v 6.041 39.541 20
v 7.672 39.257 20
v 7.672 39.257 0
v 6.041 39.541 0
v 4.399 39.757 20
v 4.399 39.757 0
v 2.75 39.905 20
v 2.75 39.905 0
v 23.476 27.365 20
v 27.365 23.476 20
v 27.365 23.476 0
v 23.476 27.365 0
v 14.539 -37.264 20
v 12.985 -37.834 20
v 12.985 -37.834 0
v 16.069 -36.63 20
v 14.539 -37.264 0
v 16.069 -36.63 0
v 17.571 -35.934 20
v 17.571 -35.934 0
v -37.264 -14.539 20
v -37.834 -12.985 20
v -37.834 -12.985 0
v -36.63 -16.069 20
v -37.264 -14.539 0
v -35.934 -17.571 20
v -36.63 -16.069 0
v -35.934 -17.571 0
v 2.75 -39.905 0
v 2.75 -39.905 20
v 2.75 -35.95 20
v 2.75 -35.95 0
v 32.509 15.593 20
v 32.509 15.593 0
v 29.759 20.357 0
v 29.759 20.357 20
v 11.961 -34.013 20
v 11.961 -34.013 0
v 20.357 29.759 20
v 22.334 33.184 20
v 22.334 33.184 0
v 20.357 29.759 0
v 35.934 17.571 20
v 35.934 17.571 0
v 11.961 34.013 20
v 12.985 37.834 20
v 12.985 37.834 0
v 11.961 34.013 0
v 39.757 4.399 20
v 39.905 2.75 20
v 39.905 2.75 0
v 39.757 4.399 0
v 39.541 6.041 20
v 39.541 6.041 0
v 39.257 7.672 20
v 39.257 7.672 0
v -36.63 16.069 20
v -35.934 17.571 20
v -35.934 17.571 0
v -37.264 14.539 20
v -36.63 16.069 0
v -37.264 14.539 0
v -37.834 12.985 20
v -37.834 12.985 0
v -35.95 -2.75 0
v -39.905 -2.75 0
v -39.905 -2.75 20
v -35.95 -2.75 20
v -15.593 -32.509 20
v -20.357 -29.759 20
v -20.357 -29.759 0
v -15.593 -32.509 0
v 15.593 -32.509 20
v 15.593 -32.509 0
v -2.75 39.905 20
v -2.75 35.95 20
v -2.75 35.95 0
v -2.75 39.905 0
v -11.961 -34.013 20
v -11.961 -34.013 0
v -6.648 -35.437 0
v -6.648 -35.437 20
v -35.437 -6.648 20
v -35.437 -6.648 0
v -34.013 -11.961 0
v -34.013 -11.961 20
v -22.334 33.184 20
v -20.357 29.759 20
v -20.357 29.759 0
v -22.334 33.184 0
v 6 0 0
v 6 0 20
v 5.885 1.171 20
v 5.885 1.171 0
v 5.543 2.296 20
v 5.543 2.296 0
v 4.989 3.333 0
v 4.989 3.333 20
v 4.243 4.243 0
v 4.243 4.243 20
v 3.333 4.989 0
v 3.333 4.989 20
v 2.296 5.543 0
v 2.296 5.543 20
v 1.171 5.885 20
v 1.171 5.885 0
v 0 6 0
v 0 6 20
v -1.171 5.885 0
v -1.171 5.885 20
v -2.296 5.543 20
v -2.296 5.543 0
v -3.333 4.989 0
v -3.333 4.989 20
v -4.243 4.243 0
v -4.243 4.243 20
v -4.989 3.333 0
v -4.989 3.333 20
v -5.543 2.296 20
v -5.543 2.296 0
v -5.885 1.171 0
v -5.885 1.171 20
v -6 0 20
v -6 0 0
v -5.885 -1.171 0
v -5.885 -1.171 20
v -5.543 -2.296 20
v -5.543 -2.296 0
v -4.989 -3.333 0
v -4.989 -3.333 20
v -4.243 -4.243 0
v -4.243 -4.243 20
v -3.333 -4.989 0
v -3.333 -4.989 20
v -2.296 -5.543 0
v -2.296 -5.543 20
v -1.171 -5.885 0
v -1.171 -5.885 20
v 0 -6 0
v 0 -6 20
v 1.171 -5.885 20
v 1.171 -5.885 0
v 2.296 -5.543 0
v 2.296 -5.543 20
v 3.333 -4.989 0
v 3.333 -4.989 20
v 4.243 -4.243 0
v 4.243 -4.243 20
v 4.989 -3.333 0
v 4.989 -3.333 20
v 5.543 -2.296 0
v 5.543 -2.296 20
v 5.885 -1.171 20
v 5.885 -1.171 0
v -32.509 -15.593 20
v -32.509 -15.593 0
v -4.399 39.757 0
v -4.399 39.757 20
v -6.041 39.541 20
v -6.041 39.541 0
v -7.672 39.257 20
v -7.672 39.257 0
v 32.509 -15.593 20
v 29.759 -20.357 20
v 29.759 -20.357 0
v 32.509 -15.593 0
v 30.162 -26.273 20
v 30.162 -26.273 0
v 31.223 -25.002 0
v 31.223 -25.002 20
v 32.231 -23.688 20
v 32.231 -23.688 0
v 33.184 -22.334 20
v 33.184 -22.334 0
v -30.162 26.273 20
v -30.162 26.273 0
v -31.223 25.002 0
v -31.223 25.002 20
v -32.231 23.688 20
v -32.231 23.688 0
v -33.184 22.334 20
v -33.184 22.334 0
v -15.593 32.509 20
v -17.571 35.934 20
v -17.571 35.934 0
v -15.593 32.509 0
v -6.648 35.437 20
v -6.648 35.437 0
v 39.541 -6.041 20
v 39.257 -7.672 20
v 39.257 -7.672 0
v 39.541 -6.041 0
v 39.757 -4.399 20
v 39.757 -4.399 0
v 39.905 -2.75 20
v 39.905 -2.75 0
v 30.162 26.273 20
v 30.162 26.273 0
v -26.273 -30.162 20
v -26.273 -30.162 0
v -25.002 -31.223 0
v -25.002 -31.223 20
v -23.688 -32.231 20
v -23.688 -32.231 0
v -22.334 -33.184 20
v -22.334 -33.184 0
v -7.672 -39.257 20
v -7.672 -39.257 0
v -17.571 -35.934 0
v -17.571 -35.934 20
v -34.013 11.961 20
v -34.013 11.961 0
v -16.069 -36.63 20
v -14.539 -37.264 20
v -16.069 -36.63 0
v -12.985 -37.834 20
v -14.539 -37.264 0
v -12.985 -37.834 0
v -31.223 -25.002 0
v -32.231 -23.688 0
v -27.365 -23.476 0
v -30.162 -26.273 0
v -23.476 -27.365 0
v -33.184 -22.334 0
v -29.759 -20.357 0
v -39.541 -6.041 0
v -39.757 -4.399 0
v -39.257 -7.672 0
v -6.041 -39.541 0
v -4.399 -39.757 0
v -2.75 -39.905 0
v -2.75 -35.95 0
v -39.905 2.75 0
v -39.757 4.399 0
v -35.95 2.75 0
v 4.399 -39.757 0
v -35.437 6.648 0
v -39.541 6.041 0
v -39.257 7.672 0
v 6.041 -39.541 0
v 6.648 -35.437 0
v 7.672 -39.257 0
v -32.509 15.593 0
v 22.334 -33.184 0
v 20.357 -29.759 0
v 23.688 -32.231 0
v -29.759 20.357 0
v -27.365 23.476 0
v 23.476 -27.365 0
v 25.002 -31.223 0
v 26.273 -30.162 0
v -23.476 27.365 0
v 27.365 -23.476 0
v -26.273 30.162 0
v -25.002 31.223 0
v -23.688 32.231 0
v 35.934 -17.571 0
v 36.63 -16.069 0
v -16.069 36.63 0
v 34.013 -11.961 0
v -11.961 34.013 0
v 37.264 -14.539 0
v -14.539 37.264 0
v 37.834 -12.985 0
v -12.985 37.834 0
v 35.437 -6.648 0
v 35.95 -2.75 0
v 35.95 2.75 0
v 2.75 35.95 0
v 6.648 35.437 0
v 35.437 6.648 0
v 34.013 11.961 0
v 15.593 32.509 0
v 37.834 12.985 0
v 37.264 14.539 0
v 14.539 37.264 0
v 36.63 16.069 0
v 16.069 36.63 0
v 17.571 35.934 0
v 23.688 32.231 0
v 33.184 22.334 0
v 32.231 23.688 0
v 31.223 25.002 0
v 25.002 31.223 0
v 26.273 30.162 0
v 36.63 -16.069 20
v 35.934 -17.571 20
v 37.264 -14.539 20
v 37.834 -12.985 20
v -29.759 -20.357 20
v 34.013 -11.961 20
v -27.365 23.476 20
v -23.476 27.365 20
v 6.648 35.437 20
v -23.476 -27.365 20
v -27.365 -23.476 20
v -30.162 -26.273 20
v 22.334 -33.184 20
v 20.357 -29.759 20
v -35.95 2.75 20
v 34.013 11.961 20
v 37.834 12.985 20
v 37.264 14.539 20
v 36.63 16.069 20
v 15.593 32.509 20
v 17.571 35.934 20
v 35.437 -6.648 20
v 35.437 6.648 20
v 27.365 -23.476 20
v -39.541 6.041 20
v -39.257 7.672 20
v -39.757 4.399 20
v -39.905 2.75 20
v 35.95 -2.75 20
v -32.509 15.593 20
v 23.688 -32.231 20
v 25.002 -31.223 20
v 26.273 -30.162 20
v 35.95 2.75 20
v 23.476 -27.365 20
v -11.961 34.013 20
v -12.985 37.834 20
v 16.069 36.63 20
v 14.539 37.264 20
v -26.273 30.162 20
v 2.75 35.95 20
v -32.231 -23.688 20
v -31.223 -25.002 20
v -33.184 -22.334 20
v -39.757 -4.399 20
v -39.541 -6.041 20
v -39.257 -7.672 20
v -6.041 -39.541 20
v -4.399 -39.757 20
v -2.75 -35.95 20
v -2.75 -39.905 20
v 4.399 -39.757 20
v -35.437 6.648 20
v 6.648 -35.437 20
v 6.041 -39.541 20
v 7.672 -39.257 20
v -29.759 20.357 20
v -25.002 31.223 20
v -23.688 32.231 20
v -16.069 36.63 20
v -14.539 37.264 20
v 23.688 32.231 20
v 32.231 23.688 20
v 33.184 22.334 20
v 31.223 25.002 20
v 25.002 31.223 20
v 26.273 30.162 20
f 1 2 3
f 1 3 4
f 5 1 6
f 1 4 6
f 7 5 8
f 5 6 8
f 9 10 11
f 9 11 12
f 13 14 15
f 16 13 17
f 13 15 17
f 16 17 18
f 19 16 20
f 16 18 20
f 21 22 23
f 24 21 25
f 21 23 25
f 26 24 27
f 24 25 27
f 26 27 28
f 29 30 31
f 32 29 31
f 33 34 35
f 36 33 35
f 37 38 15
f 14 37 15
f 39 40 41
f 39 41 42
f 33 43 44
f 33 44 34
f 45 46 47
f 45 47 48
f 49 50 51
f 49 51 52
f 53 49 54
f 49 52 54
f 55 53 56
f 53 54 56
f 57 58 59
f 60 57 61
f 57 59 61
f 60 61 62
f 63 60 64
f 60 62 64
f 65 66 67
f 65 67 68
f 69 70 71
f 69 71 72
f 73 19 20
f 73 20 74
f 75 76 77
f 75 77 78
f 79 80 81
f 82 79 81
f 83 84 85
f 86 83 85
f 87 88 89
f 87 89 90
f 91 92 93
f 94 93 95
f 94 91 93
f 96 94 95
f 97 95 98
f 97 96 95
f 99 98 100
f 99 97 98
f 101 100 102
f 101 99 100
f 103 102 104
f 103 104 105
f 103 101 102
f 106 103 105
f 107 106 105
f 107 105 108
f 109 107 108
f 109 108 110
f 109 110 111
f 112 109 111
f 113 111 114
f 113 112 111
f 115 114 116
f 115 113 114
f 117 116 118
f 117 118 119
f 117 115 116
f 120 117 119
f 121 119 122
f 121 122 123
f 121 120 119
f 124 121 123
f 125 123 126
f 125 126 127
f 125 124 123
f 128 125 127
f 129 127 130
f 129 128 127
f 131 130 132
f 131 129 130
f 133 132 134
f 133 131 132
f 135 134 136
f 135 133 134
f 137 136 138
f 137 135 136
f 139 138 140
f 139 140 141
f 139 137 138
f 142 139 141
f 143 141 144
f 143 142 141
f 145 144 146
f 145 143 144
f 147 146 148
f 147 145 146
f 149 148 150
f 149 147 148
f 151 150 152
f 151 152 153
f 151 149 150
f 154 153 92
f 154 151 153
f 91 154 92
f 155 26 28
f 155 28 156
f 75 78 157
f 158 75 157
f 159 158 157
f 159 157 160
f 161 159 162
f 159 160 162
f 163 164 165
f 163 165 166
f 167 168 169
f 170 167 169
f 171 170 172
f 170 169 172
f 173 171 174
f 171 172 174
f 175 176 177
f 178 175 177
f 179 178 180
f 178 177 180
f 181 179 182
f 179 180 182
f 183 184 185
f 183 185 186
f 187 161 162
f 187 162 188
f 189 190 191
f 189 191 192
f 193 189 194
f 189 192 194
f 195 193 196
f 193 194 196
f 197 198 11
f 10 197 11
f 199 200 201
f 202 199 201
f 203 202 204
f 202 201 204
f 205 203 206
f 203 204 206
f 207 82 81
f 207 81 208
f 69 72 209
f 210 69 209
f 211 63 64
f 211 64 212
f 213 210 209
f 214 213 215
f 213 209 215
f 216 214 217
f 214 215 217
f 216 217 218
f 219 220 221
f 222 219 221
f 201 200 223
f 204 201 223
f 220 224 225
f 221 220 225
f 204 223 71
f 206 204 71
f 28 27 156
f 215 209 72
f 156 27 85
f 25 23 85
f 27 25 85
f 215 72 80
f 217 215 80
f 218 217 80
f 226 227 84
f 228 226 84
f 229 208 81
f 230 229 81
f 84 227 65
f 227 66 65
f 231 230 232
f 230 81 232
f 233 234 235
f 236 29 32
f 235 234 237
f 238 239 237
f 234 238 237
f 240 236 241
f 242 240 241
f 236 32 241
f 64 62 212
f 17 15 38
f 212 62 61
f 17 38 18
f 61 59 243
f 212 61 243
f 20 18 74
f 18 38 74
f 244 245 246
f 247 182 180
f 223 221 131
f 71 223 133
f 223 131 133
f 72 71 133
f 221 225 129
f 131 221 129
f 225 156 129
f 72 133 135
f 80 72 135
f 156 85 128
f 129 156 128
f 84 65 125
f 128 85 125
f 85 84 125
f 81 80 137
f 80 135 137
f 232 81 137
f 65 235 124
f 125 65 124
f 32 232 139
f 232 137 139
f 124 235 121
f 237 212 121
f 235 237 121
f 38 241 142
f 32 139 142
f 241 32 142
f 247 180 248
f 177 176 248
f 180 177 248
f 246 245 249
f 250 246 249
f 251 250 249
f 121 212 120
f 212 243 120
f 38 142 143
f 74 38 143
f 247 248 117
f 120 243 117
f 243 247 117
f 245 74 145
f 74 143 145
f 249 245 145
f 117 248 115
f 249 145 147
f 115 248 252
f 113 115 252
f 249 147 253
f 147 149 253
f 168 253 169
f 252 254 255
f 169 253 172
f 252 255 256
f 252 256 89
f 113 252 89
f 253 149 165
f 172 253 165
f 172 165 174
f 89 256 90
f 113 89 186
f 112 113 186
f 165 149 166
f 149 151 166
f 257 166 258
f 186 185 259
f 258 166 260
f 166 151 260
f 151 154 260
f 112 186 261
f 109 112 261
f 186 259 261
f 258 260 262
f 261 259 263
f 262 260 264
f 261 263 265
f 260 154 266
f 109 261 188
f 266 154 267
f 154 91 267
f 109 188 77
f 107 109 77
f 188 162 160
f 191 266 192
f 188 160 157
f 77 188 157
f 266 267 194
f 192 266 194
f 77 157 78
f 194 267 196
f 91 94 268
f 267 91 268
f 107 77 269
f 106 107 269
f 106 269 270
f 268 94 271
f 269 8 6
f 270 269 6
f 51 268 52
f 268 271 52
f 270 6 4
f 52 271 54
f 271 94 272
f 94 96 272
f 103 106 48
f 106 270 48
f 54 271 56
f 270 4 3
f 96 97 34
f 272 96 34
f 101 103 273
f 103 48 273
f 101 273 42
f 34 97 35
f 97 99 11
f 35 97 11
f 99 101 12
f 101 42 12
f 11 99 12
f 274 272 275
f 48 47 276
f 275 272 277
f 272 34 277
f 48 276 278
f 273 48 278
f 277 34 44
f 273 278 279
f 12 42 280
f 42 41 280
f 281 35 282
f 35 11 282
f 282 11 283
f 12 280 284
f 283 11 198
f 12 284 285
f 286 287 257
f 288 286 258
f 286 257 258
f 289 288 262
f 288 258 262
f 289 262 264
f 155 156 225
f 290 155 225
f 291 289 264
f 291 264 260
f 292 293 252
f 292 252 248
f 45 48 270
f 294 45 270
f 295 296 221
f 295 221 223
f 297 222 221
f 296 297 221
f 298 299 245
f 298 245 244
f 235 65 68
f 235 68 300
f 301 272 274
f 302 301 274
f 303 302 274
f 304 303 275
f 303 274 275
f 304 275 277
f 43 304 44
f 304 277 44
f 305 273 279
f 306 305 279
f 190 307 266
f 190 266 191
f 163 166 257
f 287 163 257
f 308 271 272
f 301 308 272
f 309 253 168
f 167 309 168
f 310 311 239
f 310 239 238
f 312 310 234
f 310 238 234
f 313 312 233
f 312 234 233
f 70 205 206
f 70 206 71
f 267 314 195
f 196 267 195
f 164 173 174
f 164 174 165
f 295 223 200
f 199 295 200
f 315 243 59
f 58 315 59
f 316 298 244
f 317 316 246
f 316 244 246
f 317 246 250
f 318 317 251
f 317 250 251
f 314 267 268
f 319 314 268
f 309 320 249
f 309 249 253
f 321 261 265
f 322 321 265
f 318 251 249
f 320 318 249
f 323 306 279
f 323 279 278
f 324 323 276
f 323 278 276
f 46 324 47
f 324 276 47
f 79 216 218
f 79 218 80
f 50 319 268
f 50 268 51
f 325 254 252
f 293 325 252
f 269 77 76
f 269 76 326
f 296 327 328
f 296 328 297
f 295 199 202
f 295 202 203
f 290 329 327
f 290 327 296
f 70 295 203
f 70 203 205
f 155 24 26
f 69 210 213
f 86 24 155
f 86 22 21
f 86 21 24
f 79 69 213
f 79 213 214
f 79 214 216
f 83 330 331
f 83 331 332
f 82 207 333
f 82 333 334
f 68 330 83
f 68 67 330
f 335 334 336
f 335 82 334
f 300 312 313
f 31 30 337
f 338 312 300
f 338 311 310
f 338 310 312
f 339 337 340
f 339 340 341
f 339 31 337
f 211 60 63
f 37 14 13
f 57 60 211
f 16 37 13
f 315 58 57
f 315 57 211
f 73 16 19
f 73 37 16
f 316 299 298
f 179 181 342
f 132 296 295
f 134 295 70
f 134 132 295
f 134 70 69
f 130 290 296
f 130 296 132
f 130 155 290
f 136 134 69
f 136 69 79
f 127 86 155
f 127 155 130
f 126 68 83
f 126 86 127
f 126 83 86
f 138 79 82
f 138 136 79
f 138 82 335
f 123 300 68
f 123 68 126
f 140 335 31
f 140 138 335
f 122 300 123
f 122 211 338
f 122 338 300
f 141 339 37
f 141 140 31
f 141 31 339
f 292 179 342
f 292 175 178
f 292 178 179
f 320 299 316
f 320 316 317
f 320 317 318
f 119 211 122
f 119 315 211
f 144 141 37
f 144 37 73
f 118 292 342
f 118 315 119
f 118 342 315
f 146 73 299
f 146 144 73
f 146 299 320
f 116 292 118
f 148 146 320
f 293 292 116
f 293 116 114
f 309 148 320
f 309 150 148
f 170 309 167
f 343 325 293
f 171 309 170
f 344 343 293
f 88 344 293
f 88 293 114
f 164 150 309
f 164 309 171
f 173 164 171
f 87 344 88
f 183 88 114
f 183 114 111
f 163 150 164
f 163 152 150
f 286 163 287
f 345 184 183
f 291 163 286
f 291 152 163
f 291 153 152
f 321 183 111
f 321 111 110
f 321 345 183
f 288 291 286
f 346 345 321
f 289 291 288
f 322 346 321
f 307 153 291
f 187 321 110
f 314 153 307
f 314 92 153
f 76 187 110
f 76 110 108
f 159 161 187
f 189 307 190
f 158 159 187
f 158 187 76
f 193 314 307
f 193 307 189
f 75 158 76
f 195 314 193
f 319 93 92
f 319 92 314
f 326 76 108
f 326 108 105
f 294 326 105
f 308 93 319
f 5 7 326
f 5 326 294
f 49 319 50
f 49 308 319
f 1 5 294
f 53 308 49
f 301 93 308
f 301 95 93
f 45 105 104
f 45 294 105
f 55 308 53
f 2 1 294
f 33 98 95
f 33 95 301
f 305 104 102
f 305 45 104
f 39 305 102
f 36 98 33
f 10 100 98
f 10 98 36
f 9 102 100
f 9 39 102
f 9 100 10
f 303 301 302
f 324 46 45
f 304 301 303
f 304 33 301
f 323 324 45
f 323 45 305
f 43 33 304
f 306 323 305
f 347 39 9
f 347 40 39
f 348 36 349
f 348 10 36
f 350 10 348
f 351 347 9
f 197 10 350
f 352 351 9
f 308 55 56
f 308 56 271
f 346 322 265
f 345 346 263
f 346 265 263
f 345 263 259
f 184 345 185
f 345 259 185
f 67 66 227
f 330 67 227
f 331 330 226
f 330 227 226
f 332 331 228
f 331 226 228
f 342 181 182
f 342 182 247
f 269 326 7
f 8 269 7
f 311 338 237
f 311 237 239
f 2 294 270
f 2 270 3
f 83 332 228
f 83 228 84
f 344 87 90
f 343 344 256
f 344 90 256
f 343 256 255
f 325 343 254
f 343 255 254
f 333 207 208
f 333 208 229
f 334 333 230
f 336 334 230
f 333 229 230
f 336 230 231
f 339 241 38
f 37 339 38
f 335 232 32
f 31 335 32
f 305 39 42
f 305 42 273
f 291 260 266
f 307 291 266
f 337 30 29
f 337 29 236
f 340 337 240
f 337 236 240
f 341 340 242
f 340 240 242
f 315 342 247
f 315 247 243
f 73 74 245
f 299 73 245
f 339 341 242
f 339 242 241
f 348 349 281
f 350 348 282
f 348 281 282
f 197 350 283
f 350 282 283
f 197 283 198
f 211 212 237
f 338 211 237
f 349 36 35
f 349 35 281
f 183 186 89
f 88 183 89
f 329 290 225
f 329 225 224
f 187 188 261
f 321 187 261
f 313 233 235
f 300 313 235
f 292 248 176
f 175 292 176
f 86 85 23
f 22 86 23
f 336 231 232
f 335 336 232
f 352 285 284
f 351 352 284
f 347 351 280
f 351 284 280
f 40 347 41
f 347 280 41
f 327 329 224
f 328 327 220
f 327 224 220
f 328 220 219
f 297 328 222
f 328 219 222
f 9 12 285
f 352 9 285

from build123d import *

# Parameters (mm, degrees)
SKETCH2_R           = 40
BOSS_EXTRUDE1_DEPTH = 20
SKETCH3_W           = 5.5
SKETCH3_H           = 4.31
SKETCH3_W_2         = 4.31
SKETCH3_H_2         = 5.5
CUT_EXTRUDE1_DEPTH  = 20
SKETCH4_R           = 6
CUT_EXTRUDE2_DEPTH  = 20


with BuildPart() as part:
    # Sketch2 → Boss-Extrude1 (new body)
    with BuildSketch(Plane.XY):
        Circle(SKETCH2_R)
    extrude(amount=BOSS_EXTRUDE1_DEPTH)

    # Sketch3 → Cut-Extrude1 (cut)
    with BuildSketch(Plane.XY):
        Polygon((-6.648248649, -35.436785829), (-7.763758734, -39.59992614), (-13.076350778, -38.176421392), (-11.960840694, -34.013281081), align=None)
        with Locations((0, -38.105)):
            Rectangle(SKETCH3_W, SKETCH3_H)
        Polygon((-15.59343014, -32.508613266), (-17.74843014, -36.241182756), (-22.51156986, -33.491182756), (-20.35656986, -29.758613266), align=None)
        Polygon((-23.475945135, -27.365032432), (-26.523575362, -30.412662659), (-30.412662659, -26.523575362), (-27.365032432, -23.475945135), align=None)
        Polygon((-29.758613266, -20.35656986), (-33.491182756, -22.51156986), (-36.241182756, -17.74843014), (-32.508613266, -15.59343014), align=None)
        Polygon((-34.013281081, -11.960840694), (-38.176421392, -13.076350778), (-39.59992614, -7.763758734), (-35.436785829, -6.648248649), align=None)
        with Locations((-38.105, 0)):
            Rectangle(SKETCH3_W_2, SKETCH3_H_2)
        Polygon((-35.436785829, 6.648248649), (-39.59992614, 7.763758734), (-38.176421392, 13.076350778), (-34.013281081, 11.960840694), align=None)
        Polygon((-32.508613266, 15.59343014), (-36.241182756, 17.74843014), (-33.491182756, 22.51156986), (-29.758613266, 20.35656986), align=None)
        Polygon((-27.365032432, 23.475945135), (-30.412662659, 26.523575362), (-26.523575362, 30.412662659), (-23.475945135, 27.365032432), align=None)
        Polygon((-20.35656986, 29.758613266), (-22.51156986, 33.491182756), (-17.74843014, 36.241182756), (-15.59343014, 32.508613266), align=None)
        Polygon((-11.960840694, 34.013281081), (-13.076350778, 38.176421392), (-7.763758734, 39.59992614), (-6.648248649, 35.436785829), align=None)
        with Locations((0, 38.105)):
            Rectangle(SKETCH3_W, SKETCH3_H)
        Polygon((6.648248649, 35.436785829), (7.763758734, 39.59992614), (13.076350778, 38.176421392), (11.960840694, 34.013281081), align=None)
        Polygon((15.59343014, 32.508613266), (17.74843014, 36.241182756), (22.51156986, 33.491182756), (20.35656986, 29.758613266), align=None)
        Polygon((23.475945135, 27.365032432), (26.523575362, 30.412662659), (30.412662659, 26.523575362), (27.365032432, 23.475945135), align=None)
        Polygon((29.758613266, 20.35656986), (33.491182756, 22.51156986), (36.241182756, 17.74843014), (32.508613266, 15.59343014), align=None)
        Polygon((34.013281081, 11.960840694), (38.176421392, 13.076350778), (39.59992614, 7.763758734), (35.436785829, 6.648248649), align=None)
        with Locations((38.105, 0)):
            Rectangle(SKETCH3_W_2, SKETCH3_H_2)
        Polygon((35.436785829, -6.648248649), (39.59992614, -7.763758734), (38.176421392, -13.076350778), (34.013281081, -11.960840694), align=None)
        Polygon((32.508613266, -15.59343014), (36.241182756, -17.74843014), (33.491182756, -22.51156986), (29.758613266, -20.35656986), align=None)
        Polygon((27.365032432, -23.475945135), (30.412662659, -26.523575362), (26.523575362, -30.412662659), (23.475945135, -27.365032432), align=None)
        Polygon((20.35656986, -29.758613266), (22.51156986, -33.491182756), (17.74843014, -36.241182756), (15.59343014, -32.508613266), align=None)
        Polygon((11.960840694, -34.013281081), (13.076350778, -38.176421392), (7.763758734, -39.59992614), (6.648248649, -35.436785829), align=None)
    extrude(amount=CUT_EXTRUDE1_DEPTH, mode=Mode.SUBTRACT)

    # Sketch4 → Cut-Extrude2 (cut)
    with BuildSketch(Plane.XY):
        Circle(SKETCH4_R)
    extrude(amount=CUT_EXTRUDE2_DEPTH, mode=Mode.SUBTRACT)


solid = part.part
